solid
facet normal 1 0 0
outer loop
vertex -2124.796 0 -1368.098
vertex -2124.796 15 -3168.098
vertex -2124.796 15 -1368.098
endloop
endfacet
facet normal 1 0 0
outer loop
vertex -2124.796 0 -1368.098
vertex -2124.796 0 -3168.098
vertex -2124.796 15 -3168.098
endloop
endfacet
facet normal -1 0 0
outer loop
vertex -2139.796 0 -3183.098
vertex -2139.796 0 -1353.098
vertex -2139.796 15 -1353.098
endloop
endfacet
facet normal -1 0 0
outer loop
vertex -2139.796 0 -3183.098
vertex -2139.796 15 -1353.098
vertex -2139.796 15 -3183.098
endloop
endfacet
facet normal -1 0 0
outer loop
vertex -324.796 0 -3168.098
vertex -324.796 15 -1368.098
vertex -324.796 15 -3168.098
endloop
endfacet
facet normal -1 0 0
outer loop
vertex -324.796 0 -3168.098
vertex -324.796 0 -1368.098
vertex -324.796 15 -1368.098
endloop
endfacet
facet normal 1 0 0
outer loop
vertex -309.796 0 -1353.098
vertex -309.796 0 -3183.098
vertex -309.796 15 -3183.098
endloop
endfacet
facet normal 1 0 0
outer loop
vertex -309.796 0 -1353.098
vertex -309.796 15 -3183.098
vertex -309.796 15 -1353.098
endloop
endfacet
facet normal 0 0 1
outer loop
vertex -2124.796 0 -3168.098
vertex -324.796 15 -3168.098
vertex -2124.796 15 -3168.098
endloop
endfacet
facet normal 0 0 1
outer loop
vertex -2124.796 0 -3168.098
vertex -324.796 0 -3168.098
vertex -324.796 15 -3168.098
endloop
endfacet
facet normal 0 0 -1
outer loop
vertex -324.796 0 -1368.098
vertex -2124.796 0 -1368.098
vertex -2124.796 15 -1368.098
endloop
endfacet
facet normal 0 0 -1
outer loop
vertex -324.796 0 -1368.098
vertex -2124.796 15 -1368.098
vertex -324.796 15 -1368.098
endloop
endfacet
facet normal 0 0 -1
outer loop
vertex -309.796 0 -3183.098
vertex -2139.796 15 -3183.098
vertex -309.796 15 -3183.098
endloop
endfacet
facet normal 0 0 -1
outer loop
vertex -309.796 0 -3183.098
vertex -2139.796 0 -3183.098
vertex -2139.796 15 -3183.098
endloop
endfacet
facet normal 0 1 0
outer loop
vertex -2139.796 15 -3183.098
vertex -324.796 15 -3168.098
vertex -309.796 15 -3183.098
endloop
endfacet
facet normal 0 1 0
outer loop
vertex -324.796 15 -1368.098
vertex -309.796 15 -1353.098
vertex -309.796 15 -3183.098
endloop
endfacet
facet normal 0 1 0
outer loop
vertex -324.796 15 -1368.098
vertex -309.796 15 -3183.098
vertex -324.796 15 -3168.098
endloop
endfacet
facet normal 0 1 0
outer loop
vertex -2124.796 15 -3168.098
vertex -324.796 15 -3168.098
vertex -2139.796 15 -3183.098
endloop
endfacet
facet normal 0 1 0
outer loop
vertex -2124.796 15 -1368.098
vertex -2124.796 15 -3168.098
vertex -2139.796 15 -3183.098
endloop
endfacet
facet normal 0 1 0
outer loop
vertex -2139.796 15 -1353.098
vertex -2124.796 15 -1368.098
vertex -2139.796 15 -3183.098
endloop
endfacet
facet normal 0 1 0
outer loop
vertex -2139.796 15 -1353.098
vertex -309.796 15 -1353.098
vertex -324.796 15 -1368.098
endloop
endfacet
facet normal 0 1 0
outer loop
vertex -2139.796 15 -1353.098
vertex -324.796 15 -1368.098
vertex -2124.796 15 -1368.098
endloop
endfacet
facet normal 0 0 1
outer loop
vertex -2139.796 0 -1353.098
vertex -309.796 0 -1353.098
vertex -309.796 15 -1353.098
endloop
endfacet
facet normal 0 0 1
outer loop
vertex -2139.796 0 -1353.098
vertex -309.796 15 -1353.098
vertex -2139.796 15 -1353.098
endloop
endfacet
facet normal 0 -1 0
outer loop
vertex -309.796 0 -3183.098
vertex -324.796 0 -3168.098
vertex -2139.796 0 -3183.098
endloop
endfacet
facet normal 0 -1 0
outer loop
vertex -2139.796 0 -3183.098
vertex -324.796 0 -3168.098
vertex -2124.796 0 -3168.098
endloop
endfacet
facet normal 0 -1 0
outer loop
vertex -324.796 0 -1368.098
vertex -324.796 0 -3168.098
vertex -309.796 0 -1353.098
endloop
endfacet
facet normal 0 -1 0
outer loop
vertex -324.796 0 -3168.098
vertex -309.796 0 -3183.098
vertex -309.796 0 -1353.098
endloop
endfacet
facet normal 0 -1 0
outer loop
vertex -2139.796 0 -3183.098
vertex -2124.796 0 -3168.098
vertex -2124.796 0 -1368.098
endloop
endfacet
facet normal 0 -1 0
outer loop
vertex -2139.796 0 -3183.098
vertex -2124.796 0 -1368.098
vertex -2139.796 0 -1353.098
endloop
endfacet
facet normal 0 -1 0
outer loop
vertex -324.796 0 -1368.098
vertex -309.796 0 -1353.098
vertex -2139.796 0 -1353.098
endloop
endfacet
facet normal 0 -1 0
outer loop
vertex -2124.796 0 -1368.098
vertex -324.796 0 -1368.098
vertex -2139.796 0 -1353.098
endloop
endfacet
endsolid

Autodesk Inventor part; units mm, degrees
ref_plane "YZ Plane" through (0, 0, 0) normal (1, 0, 0) x (0, 1, 0)
ref_plane "XZ Plane" through (0, 0, 0) normal (0, 1, 0) x (-1, 0, 0)
ref_plane "XY Plane" through (0, 0, 0) normal (0, 0, 1) x (1, 0, 0)
sketch "Skizze1" plane through (0, 0, 0) normal (0, 1, 0) x (-1, 0, 0)
  line L0 (2124.7965, -1368.0982) -> (324.7965, -1368.0982)
  line L1 (324.7965, -1368.0982) -> (324.7965, -3168.0982)
  line L2 (324.7965, -3168.0982) -> (2124.7965, -3168.0982)
  line L3 (2124.7965, -3168.0982) -> (2124.7965, -1368.0982)
  line L4 (309.7965, -1353.0982) -> (2139.7965, -1353.0982)
  line L5 (2139.7965, -1353.0982) -> (2139.7965, -3183.0982)
  line L6 (2139.7965, -3183.0982) -> (309.7965, -3183.0982)
  line L7 (309.7965, -3183.0982) -> (309.7965, -1353.0982)
  line L8 (309.7965, -1353.0982) -> (2139.7965, -3183.0982) construction
  line L9 (2139.7965, -1353.0982) -> (309.7965, -3183.0982) construction
  point P0 (0, 0)
  point P1 (1224.7965, -2268.0982)
  dimension "d0" = 1800
  dimension "d1" = 1800
  dimension "d2" = 15
  dimension "d3" = 15
  dimension "d4" = 15
  dimension "d5" = 15
extrude "Extrusion1" add sketch "Skizze1" along normal blind 15
properties part number "Rahmen"
